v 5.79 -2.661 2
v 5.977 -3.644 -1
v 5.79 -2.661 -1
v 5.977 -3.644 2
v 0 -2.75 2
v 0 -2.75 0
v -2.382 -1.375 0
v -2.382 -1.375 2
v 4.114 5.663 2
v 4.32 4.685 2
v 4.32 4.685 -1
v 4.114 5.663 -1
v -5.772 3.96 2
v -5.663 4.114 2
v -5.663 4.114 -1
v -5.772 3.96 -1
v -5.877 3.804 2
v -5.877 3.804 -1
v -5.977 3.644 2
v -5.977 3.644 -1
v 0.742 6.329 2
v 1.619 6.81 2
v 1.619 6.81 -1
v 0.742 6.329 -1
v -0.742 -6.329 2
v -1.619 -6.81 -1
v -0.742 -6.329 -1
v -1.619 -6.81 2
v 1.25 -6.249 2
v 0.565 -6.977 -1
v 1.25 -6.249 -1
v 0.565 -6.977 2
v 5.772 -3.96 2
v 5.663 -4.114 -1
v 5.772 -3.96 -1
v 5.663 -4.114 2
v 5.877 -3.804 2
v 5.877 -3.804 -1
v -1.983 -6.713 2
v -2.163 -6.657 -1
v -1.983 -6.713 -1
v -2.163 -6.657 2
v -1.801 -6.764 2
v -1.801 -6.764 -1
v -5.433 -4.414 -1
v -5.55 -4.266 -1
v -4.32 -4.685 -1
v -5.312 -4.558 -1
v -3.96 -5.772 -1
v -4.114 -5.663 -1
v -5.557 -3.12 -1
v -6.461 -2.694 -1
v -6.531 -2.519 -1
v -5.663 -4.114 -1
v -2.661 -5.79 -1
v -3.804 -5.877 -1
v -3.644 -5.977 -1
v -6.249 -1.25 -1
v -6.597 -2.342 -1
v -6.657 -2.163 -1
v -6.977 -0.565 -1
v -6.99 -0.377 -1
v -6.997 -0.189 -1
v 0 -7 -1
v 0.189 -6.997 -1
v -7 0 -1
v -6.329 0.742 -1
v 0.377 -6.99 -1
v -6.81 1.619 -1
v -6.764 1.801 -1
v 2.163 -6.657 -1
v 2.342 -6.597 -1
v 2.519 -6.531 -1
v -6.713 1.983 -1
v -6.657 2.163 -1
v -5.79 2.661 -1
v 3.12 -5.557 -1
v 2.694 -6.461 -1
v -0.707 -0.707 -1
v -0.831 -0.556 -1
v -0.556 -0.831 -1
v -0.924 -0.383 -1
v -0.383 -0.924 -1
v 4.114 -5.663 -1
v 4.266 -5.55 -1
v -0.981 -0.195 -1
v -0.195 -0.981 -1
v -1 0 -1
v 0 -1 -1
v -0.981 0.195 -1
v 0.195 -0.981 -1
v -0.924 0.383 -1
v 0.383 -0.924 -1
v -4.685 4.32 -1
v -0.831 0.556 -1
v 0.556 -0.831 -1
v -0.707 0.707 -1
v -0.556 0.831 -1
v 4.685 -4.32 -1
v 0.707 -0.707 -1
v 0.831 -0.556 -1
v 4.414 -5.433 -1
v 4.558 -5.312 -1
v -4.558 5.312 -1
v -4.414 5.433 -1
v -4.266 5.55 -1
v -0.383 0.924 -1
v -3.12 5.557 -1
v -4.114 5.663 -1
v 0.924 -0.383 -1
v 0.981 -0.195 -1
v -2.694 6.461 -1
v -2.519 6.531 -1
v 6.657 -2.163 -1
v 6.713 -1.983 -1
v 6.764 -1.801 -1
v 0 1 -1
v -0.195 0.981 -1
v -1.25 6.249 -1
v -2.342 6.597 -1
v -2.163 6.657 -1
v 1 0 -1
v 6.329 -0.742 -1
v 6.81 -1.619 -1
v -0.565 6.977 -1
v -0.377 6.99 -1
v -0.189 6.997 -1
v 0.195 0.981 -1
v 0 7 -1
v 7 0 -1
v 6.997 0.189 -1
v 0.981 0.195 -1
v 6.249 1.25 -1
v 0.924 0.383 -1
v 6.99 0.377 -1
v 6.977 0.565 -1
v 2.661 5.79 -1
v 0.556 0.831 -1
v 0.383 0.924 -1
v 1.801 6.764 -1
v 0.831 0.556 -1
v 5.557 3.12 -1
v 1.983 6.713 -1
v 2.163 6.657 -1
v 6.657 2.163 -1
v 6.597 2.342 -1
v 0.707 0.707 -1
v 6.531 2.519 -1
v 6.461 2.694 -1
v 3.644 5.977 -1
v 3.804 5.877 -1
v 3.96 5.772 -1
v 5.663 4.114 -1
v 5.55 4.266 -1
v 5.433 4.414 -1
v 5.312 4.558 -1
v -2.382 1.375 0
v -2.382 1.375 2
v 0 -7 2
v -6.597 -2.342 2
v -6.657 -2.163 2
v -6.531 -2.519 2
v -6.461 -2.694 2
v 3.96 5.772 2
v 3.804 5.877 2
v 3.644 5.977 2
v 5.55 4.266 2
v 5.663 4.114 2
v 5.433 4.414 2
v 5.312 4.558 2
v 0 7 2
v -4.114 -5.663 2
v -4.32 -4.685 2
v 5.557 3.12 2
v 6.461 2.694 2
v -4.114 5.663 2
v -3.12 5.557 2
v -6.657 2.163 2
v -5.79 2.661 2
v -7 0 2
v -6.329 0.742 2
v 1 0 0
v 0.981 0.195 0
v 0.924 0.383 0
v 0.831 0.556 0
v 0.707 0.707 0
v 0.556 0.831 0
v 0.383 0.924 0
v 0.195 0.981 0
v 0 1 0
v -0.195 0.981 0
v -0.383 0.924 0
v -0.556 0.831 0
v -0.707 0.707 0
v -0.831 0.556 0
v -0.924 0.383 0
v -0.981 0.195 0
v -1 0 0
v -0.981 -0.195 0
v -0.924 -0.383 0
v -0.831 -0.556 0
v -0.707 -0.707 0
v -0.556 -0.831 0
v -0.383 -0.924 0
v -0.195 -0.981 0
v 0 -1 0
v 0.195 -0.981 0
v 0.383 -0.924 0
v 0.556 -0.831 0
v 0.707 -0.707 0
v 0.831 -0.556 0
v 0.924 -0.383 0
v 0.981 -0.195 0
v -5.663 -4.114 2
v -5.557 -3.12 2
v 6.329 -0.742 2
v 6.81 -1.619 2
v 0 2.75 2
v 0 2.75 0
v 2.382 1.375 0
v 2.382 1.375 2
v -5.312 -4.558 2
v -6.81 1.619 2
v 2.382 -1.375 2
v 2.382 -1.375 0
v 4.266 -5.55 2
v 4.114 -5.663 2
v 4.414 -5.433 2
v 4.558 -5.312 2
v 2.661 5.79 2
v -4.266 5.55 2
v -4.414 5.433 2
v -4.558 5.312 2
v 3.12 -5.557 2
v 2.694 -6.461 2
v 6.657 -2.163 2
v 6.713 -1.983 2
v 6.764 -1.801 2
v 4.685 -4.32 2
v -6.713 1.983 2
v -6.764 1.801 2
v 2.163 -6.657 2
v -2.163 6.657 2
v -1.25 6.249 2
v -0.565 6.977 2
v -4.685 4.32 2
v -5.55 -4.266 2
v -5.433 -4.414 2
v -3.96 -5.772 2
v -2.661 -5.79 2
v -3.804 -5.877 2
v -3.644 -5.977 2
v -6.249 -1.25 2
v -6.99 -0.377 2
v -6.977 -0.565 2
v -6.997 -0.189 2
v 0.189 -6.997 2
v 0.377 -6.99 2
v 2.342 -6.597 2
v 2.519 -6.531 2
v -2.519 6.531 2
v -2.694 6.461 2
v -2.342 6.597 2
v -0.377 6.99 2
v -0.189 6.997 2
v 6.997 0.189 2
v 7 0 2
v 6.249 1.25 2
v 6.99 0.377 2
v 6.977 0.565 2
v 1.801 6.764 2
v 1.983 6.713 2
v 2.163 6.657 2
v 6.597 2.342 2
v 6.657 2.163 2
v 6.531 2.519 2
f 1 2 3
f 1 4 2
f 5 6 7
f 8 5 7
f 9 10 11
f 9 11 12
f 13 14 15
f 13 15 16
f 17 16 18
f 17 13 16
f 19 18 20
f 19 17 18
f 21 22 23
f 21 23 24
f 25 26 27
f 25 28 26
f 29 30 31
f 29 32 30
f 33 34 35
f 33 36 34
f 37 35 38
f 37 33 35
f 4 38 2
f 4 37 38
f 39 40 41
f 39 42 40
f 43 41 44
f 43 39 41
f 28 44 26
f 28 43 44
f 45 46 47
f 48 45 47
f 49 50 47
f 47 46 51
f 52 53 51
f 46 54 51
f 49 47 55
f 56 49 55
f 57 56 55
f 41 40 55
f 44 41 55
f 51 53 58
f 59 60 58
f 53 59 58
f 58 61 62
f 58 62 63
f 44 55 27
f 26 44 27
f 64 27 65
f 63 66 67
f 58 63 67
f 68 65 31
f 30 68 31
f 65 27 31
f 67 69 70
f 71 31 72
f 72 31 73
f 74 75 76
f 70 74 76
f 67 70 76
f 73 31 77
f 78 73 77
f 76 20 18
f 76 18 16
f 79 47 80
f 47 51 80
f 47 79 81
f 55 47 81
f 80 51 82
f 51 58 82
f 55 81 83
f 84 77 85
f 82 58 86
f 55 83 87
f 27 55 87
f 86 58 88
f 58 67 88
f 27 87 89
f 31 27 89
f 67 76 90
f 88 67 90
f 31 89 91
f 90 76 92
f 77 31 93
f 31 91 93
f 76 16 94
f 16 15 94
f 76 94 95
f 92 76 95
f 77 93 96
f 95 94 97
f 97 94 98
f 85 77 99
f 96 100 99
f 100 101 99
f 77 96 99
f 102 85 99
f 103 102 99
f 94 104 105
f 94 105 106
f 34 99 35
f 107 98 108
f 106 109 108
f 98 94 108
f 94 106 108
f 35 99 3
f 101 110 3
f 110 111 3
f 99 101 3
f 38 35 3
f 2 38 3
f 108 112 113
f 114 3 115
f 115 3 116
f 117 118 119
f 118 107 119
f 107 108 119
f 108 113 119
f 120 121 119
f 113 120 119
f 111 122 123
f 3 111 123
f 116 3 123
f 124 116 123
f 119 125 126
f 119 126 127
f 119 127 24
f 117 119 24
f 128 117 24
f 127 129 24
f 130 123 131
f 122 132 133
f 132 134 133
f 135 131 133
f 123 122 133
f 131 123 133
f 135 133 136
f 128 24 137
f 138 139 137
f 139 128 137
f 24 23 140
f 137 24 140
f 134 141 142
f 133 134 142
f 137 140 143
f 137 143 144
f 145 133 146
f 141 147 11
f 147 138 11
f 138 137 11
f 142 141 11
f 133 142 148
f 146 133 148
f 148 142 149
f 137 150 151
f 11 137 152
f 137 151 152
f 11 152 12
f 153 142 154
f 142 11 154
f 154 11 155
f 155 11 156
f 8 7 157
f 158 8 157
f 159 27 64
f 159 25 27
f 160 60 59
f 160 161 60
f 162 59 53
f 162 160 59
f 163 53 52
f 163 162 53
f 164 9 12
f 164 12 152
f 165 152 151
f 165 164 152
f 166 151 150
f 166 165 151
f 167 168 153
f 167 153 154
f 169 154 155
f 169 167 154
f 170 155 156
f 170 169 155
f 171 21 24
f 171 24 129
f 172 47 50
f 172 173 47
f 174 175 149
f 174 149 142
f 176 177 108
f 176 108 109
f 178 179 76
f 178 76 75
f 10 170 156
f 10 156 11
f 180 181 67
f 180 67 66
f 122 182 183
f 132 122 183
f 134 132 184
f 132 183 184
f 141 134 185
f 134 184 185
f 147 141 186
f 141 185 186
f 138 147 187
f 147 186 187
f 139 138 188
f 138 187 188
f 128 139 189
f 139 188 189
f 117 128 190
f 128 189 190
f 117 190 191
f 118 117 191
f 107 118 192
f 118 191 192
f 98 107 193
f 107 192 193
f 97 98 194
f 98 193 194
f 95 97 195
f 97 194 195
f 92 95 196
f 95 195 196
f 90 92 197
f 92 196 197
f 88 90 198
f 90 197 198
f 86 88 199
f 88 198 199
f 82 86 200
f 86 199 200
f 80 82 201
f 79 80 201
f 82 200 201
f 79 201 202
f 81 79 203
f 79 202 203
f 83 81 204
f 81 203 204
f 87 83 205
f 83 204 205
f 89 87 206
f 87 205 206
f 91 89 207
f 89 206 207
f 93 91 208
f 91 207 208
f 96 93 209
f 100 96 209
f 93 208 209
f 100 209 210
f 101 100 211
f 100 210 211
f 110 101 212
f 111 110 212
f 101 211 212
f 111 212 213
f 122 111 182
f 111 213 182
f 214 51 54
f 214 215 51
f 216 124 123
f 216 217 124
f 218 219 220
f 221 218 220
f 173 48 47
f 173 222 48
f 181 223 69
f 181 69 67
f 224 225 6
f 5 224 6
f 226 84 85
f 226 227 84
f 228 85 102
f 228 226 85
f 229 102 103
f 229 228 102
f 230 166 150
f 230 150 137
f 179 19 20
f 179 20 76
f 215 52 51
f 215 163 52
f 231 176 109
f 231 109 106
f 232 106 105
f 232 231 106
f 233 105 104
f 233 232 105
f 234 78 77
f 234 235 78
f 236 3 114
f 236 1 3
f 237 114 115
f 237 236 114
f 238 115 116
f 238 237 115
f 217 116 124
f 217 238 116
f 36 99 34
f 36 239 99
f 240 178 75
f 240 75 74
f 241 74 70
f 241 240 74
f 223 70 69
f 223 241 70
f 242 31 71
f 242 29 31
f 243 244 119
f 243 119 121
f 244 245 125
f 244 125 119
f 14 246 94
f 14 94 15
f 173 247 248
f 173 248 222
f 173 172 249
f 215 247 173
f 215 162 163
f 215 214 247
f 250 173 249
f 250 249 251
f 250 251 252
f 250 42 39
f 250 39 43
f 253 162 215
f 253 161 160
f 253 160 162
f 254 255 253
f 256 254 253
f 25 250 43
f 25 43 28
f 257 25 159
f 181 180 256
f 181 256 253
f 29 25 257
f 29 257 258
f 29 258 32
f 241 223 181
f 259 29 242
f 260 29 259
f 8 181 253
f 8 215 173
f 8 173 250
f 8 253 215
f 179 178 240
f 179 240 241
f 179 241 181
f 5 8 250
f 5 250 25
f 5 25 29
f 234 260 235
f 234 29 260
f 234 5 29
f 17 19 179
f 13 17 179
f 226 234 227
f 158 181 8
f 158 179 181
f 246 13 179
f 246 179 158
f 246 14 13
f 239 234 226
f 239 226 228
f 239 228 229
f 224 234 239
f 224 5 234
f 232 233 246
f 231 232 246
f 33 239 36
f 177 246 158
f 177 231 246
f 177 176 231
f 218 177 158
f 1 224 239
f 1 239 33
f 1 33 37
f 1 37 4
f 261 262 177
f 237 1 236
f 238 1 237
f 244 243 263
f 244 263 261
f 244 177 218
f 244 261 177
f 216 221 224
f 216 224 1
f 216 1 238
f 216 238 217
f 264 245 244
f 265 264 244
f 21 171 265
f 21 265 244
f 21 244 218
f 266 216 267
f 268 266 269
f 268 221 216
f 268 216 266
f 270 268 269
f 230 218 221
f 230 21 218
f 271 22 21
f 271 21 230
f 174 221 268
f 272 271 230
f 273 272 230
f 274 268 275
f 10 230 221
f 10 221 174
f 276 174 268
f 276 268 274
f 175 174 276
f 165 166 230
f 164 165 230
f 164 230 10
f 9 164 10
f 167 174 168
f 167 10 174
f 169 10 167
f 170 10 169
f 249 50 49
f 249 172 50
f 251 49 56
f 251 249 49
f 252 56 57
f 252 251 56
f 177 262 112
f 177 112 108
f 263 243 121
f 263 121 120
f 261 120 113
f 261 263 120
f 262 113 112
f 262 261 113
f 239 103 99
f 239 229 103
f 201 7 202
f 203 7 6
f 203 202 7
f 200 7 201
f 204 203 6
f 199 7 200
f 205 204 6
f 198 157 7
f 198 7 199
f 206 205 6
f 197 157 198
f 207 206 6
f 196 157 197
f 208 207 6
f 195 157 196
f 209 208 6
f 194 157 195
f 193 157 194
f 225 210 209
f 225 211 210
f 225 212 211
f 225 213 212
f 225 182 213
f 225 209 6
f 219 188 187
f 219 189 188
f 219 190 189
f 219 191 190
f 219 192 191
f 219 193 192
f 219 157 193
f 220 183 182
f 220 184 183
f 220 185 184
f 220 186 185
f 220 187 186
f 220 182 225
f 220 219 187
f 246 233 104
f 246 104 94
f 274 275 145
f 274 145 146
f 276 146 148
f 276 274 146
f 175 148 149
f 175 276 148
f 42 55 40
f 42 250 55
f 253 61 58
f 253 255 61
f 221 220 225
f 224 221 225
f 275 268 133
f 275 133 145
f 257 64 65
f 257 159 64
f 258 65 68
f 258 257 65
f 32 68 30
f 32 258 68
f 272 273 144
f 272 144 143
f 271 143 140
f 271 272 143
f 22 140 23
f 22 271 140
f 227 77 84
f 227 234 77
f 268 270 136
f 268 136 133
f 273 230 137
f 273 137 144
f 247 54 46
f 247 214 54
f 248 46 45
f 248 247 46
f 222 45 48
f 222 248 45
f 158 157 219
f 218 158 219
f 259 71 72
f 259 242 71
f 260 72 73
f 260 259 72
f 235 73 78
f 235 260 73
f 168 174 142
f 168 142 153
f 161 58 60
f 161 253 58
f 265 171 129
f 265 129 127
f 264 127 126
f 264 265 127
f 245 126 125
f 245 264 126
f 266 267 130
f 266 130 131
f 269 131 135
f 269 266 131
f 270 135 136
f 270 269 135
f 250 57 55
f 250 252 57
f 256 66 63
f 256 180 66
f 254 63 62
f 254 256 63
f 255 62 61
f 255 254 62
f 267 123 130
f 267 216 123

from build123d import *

# Parameters (mm, degrees)
F1_DEPTH = 2
F0_R     = 1
F2_DEPTH = 1


with BuildPart() as f1:
    # F0 (on Top) → F1 (new body)
    with BuildSketch(Plane.XY):
        with BuildLine():
            Line((6.32937, -0.741792), (7, 0))
            ThreePointArc((7, 0), (6.994284, 0.282817), (6.977147, 0.565173))
            Line((6.977147, 0.565173), (6.248815, 1.250397))
            Line((6.248815, 1.250397), (6.657396, 2.163119))
            ThreePointArc((6.657396, 2.163119), (6.564564, 2.430328), (6.461013, 2.693568))
            Line((6.461013, 2.693568), (5.556582, 3.120188))
            Line((5.556582, 3.120188), (5.663119, 4.114497))
            ThreePointArc((5.663119, 4.114497), (5.492259, 4.339941), (5.31243, 4.558299))
            Line((5.31243, 4.558299), (4.320432, 4.684553))
            Line((4.320432, 4.684553), (4.114497, 5.663119))
            ThreePointArc((4.114497, 5.663119), (3.882333, 5.824731), (3.64383, 5.976831))
            Line((3.64383, 5.976831), (2.661369, 5.790362))
            Line((2.661369, 5.790362), (2.163119, 6.657396))
            ThreePointArc((2.163119, 6.657396), (1.892377, 6.739355), (1.618546, 6.810309))
            Line((1.618546, 6.810309), (0.741792, 6.32937))
            Line((0.741792, 6.32937), (0, 7))
            ThreePointArc((0, 7), (-0.282817, 6.994284), (-0.565173, 6.977147))
            Line((-0.565173, 6.977147), (-1.250397, 6.248815))
            Line((-1.250397, 6.248815), (-2.163119, 6.657396))
            ThreePointArc((-2.163119, 6.657396), (-2.430328, 6.564564), (-2.693568, 6.461013))
            Line((-2.693568, 6.461013), (-3.120188, 5.556582))
            Line((-3.120188, 5.556582), (-4.114497, 5.663119))
            ThreePointArc((-4.114497, 5.663119), (-4.339941, 5.492259), (-4.558299, 5.31243))
            Line((-4.558299, 5.31243), (-4.684553, 4.320432))
            Line((-4.684553, 4.320432), (-5.663119, 4.114497))
            ThreePointArc((-5.663119, 4.114497), (-5.824731, 3.882333), (-5.976831, 3.64383))
            Line((-5.976831, 3.64383), (-5.790362, 2.661369))
            Line((-5.790362, 2.661369), (-6.657396, 2.163119))
            ThreePointArc((-6.657396, 2.163119), (-6.739355, 1.892377), (-6.810309, 1.618546))
            Line((-6.810309, 1.618546), (-6.32937, 0.741792))
            Line((-6.32937, 0.741792), (-7, 0))
            ThreePointArc((-7, 0), (-6.994284, -0.282817), (-6.977147, -0.565173))
            Line((-6.977147, -0.565173), (-6.248815, -1.250397))
            Line((-6.248815, -1.250397), (-6.657396, -2.163119))
            ThreePointArc((-6.657396, -2.163119), (-6.564564, -2.430328), (-6.461013, -2.693568))
            Line((-6.461013, -2.693568), (-5.556582, -3.120188))
            Line((-5.556582, -3.120188), (-5.663119, -4.114497))
            ThreePointArc((-5.663119, -4.114497), (-5.492259, -4.339941), (-5.31243, -4.558299))
            Line((-5.31243, -4.558299), (-4.320432, -4.684553))
            Line((-4.320432, -4.684553), (-4.114497, -5.663119))
            ThreePointArc((-4.114497, -5.663119), (-3.882333, -5.824731), (-3.64383, -5.976831))
            Line((-3.64383, -5.976831), (-2.661369, -5.790362))
            Line((-2.661369, -5.790362), (-2.163119, -6.657396))
            ThreePointArc((-2.163119, -6.657396), (-1.892377, -6.739355), (-1.618546, -6.810309))
            Line((-1.618546, -6.810309), (-0.741792, -6.32937))
            Line((-0.741792, -6.32937), (0, -7))
            ThreePointArc((0, -7), (0.282817, -6.994284), (0.565173, -6.977147))
            Line((0.565173, -6.977147), (1.250397, -6.248815))
            Line((1.250397, -6.248815), (2.163119, -6.657396))
            ThreePointArc((2.163119, -6.657396), (2.430328, -6.564564), (2.693568, -6.461013))
            Line((2.693568, -6.461013), (3.120188, -5.556582))
            Line((3.120188, -5.556582), (4.114497, -5.663119))
            ThreePointArc((4.114497, -5.663119), (4.339941, -5.492259), (4.558299, -5.31243))
            Line((4.558299, -5.31243), (4.684553, -4.320432))
            Line((4.684553, -4.320432), (5.663119, -4.114497))
            ThreePointArc((5.663119, -4.114497), (5.824731, -3.882333), (5.976831, -3.64383))
            Line((5.976831, -3.64383), (5.790362, -2.661369))
            Line((5.790362, -2.661369), (6.657396, -2.163119))
            ThreePointArc((6.657396, -2.163119), (6.739355, -1.892377), (6.810309, -1.618546))
            Line((6.810309, -1.618546), (6.32937, -0.741792))
        make_face()
        Polygon((2.38157, -1.375), (0, -2.75), (-2.38157, -1.375), (-2.38157, 1.375), (0, 2.75), (2.38157, 1.375), align=None, mode=Mode.SUBTRACT)
    extrude(amount=F1_DEPTH)

    # F0 (on Top) → F2 (join)
    with BuildSketch(Plane.XY):
        with BuildLine():
            Line((6.32937, -0.741792), (7, 0))
            ThreePointArc((7, 0), (6.994284, 0.282817), (6.977147, 0.565173))
            Line((6.977147, 0.565173), (6.248815, 1.250397))
            Line((6.248815, 1.250397), (6.657396, 2.163119))
            ThreePointArc((6.657396, 2.163119), (6.564564, 2.430328), (6.461013, 2.693568))
            Line((6.461013, 2.693568), (5.556582, 3.120188))
            Line((5.556582, 3.120188), (5.663119, 4.114497))
            ThreePointArc((5.663119, 4.114497), (5.492259, 4.339941), (5.31243, 4.558299))
            Line((5.31243, 4.558299), (4.320432, 4.684553))
            Line((4.320432, 4.684553), (4.114497, 5.663119))
            ThreePointArc((4.114497, 5.663119), (3.882333, 5.824731), (3.64383, 5.976831))
            Line((3.64383, 5.976831), (2.661369, 5.790362))
            Line((2.661369, 5.790362), (2.163119, 6.657396))
            ThreePointArc((2.163119, 6.657396), (1.892377, 6.739355), (1.618546, 6.810309))
            Line((1.618546, 6.810309), (0.741792, 6.32937))
            Line((0.741792, 6.32937), (0, 7))
            ThreePointArc((0, 7), (-0.282817, 6.994284), (-0.565173, 6.977147))
            Line((-0.565173, 6.977147), (-1.250397, 6.248815))
            Line((-1.250397, 6.248815), (-2.163119, 6.657396))
            ThreePointArc((-2.163119, 6.657396), (-2.430328, 6.564564), (-2.693568, 6.461013))
            Line((-2.693568, 6.461013), (-3.120188, 5.556582))
            Line((-3.120188, 5.556582), (-4.114497, 5.663119))
            ThreePointArc((-4.114497, 5.663119), (-4.339941, 5.492259), (-4.558299, 5.31243))
            Line((-4.558299, 5.31243), (-4.684553, 4.320432))
            Line((-4.684553, 4.320432), (-5.663119, 4.114497))
            ThreePointArc((-5.663119, 4.114497), (-5.824731, 3.882333), (-5.976831, 3.64383))
            Line((-5.976831, 3.64383), (-5.790362, 2.661369))
            Line((-5.790362, 2.661369), (-6.657396, 2.163119))
            ThreePointArc((-6.657396, 2.163119), (-6.739355, 1.892377), (-6.810309, 1.618546))
            Line((-6.810309, 1.618546), (-6.32937, 0.741792))
            Line((-6.32937, 0.741792), (-7, 0))
            ThreePointArc((-7, 0), (-6.994284, -0.282817), (-6.977147, -0.565173))
            Line((-6.977147, -0.565173), (-6.248815, -1.250397))
            Line((-6.248815, -1.250397), (-6.657396, -2.163119))
            ThreePointArc((-6.657396, -2.163119), (-6.564564, -2.430328), (-6.461013, -2.693568))
            Line((-6.461013, -2.693568), (-5.556582, -3.120188))
            Line((-5.556582, -3.120188), (-5.663119, -4.114497))
            ThreePointArc((-5.663119, -4.114497), (-5.492259, -4.339941), (-5.31243, -4.558299))
            Line((-5.31243, -4.558299), (-4.320432, -4.684553))
            Line((-4.320432, -4.684553), (-4.114497, -5.663119))
            ThreePointArc((-4.114497, -5.663119), (-3.882333, -5.824731), (-3.64383, -5.976831))
            Line((-3.64383, -5.976831), (-2.661369, -5.790362))
            Line((-2.661369, -5.790362), (-2.163119, -6.657396))
            ThreePointArc((-2.163119, -6.657396), (-1.892377, -6.739355), (-1.618546, -6.810309))
            Line((-1.618546, -6.810309), (-0.741792, -6.32937))
            Line((-0.741792, -6.32937), (0, -7))
            ThreePointArc((0, -7), (0.282817, -6.994284), (0.565173, -6.977147))
            Line((0.565173, -6.977147), (1.250397, -6.248815))
            Line((1.250397, -6.248815), (2.163119, -6.657396))
            ThreePointArc((2.163119, -6.657396), (2.430328, -6.564564), (2.693568, -6.461013))
            Line((2.693568, -6.461013), (3.120188, -5.556582))
            Line((3.120188, -5.556582), (4.114497, -5.663119))
            ThreePointArc((4.114497, -5.663119), (4.339941, -5.492259), (4.558299, -5.31243))
            Line((4.558299, -5.31243), (4.684553, -4.320432))
            Line((4.684553, -4.320432), (5.663119, -4.114497))
            ThreePointArc((5.663119, -4.114497), (5.824731, -3.882333), (5.976831, -3.64383))
            Line((5.976831, -3.64383), (5.790362, -2.661369))
            Line((5.790362, -2.661369), (6.657396, -2.163119))
            ThreePointArc((6.657396, -2.163119), (6.739355, -1.892377), (6.810309, -1.618546))
            Line((6.810309, -1.618546), (6.32937, -0.741792))
        make_face()
        Polygon((2.38157, -1.375), (0, -2.75), (-2.38157, -1.375), (-2.38157, 1.375), (0, 2.75), (2.38157, 1.375), align=None, mode=Mode.SUBTRACT)
        Polygon((-2.38157, -1.375), (0, -2.75), (2.38157, -1.375), (2.38157, 1.375), (0, 2.75), (-2.38157, 1.375), align=None)
        Circle(F0_R, mode=Mode.SUBTRACT)
    extrude(amount=-F2_DEPTH)


solid = f1.part
